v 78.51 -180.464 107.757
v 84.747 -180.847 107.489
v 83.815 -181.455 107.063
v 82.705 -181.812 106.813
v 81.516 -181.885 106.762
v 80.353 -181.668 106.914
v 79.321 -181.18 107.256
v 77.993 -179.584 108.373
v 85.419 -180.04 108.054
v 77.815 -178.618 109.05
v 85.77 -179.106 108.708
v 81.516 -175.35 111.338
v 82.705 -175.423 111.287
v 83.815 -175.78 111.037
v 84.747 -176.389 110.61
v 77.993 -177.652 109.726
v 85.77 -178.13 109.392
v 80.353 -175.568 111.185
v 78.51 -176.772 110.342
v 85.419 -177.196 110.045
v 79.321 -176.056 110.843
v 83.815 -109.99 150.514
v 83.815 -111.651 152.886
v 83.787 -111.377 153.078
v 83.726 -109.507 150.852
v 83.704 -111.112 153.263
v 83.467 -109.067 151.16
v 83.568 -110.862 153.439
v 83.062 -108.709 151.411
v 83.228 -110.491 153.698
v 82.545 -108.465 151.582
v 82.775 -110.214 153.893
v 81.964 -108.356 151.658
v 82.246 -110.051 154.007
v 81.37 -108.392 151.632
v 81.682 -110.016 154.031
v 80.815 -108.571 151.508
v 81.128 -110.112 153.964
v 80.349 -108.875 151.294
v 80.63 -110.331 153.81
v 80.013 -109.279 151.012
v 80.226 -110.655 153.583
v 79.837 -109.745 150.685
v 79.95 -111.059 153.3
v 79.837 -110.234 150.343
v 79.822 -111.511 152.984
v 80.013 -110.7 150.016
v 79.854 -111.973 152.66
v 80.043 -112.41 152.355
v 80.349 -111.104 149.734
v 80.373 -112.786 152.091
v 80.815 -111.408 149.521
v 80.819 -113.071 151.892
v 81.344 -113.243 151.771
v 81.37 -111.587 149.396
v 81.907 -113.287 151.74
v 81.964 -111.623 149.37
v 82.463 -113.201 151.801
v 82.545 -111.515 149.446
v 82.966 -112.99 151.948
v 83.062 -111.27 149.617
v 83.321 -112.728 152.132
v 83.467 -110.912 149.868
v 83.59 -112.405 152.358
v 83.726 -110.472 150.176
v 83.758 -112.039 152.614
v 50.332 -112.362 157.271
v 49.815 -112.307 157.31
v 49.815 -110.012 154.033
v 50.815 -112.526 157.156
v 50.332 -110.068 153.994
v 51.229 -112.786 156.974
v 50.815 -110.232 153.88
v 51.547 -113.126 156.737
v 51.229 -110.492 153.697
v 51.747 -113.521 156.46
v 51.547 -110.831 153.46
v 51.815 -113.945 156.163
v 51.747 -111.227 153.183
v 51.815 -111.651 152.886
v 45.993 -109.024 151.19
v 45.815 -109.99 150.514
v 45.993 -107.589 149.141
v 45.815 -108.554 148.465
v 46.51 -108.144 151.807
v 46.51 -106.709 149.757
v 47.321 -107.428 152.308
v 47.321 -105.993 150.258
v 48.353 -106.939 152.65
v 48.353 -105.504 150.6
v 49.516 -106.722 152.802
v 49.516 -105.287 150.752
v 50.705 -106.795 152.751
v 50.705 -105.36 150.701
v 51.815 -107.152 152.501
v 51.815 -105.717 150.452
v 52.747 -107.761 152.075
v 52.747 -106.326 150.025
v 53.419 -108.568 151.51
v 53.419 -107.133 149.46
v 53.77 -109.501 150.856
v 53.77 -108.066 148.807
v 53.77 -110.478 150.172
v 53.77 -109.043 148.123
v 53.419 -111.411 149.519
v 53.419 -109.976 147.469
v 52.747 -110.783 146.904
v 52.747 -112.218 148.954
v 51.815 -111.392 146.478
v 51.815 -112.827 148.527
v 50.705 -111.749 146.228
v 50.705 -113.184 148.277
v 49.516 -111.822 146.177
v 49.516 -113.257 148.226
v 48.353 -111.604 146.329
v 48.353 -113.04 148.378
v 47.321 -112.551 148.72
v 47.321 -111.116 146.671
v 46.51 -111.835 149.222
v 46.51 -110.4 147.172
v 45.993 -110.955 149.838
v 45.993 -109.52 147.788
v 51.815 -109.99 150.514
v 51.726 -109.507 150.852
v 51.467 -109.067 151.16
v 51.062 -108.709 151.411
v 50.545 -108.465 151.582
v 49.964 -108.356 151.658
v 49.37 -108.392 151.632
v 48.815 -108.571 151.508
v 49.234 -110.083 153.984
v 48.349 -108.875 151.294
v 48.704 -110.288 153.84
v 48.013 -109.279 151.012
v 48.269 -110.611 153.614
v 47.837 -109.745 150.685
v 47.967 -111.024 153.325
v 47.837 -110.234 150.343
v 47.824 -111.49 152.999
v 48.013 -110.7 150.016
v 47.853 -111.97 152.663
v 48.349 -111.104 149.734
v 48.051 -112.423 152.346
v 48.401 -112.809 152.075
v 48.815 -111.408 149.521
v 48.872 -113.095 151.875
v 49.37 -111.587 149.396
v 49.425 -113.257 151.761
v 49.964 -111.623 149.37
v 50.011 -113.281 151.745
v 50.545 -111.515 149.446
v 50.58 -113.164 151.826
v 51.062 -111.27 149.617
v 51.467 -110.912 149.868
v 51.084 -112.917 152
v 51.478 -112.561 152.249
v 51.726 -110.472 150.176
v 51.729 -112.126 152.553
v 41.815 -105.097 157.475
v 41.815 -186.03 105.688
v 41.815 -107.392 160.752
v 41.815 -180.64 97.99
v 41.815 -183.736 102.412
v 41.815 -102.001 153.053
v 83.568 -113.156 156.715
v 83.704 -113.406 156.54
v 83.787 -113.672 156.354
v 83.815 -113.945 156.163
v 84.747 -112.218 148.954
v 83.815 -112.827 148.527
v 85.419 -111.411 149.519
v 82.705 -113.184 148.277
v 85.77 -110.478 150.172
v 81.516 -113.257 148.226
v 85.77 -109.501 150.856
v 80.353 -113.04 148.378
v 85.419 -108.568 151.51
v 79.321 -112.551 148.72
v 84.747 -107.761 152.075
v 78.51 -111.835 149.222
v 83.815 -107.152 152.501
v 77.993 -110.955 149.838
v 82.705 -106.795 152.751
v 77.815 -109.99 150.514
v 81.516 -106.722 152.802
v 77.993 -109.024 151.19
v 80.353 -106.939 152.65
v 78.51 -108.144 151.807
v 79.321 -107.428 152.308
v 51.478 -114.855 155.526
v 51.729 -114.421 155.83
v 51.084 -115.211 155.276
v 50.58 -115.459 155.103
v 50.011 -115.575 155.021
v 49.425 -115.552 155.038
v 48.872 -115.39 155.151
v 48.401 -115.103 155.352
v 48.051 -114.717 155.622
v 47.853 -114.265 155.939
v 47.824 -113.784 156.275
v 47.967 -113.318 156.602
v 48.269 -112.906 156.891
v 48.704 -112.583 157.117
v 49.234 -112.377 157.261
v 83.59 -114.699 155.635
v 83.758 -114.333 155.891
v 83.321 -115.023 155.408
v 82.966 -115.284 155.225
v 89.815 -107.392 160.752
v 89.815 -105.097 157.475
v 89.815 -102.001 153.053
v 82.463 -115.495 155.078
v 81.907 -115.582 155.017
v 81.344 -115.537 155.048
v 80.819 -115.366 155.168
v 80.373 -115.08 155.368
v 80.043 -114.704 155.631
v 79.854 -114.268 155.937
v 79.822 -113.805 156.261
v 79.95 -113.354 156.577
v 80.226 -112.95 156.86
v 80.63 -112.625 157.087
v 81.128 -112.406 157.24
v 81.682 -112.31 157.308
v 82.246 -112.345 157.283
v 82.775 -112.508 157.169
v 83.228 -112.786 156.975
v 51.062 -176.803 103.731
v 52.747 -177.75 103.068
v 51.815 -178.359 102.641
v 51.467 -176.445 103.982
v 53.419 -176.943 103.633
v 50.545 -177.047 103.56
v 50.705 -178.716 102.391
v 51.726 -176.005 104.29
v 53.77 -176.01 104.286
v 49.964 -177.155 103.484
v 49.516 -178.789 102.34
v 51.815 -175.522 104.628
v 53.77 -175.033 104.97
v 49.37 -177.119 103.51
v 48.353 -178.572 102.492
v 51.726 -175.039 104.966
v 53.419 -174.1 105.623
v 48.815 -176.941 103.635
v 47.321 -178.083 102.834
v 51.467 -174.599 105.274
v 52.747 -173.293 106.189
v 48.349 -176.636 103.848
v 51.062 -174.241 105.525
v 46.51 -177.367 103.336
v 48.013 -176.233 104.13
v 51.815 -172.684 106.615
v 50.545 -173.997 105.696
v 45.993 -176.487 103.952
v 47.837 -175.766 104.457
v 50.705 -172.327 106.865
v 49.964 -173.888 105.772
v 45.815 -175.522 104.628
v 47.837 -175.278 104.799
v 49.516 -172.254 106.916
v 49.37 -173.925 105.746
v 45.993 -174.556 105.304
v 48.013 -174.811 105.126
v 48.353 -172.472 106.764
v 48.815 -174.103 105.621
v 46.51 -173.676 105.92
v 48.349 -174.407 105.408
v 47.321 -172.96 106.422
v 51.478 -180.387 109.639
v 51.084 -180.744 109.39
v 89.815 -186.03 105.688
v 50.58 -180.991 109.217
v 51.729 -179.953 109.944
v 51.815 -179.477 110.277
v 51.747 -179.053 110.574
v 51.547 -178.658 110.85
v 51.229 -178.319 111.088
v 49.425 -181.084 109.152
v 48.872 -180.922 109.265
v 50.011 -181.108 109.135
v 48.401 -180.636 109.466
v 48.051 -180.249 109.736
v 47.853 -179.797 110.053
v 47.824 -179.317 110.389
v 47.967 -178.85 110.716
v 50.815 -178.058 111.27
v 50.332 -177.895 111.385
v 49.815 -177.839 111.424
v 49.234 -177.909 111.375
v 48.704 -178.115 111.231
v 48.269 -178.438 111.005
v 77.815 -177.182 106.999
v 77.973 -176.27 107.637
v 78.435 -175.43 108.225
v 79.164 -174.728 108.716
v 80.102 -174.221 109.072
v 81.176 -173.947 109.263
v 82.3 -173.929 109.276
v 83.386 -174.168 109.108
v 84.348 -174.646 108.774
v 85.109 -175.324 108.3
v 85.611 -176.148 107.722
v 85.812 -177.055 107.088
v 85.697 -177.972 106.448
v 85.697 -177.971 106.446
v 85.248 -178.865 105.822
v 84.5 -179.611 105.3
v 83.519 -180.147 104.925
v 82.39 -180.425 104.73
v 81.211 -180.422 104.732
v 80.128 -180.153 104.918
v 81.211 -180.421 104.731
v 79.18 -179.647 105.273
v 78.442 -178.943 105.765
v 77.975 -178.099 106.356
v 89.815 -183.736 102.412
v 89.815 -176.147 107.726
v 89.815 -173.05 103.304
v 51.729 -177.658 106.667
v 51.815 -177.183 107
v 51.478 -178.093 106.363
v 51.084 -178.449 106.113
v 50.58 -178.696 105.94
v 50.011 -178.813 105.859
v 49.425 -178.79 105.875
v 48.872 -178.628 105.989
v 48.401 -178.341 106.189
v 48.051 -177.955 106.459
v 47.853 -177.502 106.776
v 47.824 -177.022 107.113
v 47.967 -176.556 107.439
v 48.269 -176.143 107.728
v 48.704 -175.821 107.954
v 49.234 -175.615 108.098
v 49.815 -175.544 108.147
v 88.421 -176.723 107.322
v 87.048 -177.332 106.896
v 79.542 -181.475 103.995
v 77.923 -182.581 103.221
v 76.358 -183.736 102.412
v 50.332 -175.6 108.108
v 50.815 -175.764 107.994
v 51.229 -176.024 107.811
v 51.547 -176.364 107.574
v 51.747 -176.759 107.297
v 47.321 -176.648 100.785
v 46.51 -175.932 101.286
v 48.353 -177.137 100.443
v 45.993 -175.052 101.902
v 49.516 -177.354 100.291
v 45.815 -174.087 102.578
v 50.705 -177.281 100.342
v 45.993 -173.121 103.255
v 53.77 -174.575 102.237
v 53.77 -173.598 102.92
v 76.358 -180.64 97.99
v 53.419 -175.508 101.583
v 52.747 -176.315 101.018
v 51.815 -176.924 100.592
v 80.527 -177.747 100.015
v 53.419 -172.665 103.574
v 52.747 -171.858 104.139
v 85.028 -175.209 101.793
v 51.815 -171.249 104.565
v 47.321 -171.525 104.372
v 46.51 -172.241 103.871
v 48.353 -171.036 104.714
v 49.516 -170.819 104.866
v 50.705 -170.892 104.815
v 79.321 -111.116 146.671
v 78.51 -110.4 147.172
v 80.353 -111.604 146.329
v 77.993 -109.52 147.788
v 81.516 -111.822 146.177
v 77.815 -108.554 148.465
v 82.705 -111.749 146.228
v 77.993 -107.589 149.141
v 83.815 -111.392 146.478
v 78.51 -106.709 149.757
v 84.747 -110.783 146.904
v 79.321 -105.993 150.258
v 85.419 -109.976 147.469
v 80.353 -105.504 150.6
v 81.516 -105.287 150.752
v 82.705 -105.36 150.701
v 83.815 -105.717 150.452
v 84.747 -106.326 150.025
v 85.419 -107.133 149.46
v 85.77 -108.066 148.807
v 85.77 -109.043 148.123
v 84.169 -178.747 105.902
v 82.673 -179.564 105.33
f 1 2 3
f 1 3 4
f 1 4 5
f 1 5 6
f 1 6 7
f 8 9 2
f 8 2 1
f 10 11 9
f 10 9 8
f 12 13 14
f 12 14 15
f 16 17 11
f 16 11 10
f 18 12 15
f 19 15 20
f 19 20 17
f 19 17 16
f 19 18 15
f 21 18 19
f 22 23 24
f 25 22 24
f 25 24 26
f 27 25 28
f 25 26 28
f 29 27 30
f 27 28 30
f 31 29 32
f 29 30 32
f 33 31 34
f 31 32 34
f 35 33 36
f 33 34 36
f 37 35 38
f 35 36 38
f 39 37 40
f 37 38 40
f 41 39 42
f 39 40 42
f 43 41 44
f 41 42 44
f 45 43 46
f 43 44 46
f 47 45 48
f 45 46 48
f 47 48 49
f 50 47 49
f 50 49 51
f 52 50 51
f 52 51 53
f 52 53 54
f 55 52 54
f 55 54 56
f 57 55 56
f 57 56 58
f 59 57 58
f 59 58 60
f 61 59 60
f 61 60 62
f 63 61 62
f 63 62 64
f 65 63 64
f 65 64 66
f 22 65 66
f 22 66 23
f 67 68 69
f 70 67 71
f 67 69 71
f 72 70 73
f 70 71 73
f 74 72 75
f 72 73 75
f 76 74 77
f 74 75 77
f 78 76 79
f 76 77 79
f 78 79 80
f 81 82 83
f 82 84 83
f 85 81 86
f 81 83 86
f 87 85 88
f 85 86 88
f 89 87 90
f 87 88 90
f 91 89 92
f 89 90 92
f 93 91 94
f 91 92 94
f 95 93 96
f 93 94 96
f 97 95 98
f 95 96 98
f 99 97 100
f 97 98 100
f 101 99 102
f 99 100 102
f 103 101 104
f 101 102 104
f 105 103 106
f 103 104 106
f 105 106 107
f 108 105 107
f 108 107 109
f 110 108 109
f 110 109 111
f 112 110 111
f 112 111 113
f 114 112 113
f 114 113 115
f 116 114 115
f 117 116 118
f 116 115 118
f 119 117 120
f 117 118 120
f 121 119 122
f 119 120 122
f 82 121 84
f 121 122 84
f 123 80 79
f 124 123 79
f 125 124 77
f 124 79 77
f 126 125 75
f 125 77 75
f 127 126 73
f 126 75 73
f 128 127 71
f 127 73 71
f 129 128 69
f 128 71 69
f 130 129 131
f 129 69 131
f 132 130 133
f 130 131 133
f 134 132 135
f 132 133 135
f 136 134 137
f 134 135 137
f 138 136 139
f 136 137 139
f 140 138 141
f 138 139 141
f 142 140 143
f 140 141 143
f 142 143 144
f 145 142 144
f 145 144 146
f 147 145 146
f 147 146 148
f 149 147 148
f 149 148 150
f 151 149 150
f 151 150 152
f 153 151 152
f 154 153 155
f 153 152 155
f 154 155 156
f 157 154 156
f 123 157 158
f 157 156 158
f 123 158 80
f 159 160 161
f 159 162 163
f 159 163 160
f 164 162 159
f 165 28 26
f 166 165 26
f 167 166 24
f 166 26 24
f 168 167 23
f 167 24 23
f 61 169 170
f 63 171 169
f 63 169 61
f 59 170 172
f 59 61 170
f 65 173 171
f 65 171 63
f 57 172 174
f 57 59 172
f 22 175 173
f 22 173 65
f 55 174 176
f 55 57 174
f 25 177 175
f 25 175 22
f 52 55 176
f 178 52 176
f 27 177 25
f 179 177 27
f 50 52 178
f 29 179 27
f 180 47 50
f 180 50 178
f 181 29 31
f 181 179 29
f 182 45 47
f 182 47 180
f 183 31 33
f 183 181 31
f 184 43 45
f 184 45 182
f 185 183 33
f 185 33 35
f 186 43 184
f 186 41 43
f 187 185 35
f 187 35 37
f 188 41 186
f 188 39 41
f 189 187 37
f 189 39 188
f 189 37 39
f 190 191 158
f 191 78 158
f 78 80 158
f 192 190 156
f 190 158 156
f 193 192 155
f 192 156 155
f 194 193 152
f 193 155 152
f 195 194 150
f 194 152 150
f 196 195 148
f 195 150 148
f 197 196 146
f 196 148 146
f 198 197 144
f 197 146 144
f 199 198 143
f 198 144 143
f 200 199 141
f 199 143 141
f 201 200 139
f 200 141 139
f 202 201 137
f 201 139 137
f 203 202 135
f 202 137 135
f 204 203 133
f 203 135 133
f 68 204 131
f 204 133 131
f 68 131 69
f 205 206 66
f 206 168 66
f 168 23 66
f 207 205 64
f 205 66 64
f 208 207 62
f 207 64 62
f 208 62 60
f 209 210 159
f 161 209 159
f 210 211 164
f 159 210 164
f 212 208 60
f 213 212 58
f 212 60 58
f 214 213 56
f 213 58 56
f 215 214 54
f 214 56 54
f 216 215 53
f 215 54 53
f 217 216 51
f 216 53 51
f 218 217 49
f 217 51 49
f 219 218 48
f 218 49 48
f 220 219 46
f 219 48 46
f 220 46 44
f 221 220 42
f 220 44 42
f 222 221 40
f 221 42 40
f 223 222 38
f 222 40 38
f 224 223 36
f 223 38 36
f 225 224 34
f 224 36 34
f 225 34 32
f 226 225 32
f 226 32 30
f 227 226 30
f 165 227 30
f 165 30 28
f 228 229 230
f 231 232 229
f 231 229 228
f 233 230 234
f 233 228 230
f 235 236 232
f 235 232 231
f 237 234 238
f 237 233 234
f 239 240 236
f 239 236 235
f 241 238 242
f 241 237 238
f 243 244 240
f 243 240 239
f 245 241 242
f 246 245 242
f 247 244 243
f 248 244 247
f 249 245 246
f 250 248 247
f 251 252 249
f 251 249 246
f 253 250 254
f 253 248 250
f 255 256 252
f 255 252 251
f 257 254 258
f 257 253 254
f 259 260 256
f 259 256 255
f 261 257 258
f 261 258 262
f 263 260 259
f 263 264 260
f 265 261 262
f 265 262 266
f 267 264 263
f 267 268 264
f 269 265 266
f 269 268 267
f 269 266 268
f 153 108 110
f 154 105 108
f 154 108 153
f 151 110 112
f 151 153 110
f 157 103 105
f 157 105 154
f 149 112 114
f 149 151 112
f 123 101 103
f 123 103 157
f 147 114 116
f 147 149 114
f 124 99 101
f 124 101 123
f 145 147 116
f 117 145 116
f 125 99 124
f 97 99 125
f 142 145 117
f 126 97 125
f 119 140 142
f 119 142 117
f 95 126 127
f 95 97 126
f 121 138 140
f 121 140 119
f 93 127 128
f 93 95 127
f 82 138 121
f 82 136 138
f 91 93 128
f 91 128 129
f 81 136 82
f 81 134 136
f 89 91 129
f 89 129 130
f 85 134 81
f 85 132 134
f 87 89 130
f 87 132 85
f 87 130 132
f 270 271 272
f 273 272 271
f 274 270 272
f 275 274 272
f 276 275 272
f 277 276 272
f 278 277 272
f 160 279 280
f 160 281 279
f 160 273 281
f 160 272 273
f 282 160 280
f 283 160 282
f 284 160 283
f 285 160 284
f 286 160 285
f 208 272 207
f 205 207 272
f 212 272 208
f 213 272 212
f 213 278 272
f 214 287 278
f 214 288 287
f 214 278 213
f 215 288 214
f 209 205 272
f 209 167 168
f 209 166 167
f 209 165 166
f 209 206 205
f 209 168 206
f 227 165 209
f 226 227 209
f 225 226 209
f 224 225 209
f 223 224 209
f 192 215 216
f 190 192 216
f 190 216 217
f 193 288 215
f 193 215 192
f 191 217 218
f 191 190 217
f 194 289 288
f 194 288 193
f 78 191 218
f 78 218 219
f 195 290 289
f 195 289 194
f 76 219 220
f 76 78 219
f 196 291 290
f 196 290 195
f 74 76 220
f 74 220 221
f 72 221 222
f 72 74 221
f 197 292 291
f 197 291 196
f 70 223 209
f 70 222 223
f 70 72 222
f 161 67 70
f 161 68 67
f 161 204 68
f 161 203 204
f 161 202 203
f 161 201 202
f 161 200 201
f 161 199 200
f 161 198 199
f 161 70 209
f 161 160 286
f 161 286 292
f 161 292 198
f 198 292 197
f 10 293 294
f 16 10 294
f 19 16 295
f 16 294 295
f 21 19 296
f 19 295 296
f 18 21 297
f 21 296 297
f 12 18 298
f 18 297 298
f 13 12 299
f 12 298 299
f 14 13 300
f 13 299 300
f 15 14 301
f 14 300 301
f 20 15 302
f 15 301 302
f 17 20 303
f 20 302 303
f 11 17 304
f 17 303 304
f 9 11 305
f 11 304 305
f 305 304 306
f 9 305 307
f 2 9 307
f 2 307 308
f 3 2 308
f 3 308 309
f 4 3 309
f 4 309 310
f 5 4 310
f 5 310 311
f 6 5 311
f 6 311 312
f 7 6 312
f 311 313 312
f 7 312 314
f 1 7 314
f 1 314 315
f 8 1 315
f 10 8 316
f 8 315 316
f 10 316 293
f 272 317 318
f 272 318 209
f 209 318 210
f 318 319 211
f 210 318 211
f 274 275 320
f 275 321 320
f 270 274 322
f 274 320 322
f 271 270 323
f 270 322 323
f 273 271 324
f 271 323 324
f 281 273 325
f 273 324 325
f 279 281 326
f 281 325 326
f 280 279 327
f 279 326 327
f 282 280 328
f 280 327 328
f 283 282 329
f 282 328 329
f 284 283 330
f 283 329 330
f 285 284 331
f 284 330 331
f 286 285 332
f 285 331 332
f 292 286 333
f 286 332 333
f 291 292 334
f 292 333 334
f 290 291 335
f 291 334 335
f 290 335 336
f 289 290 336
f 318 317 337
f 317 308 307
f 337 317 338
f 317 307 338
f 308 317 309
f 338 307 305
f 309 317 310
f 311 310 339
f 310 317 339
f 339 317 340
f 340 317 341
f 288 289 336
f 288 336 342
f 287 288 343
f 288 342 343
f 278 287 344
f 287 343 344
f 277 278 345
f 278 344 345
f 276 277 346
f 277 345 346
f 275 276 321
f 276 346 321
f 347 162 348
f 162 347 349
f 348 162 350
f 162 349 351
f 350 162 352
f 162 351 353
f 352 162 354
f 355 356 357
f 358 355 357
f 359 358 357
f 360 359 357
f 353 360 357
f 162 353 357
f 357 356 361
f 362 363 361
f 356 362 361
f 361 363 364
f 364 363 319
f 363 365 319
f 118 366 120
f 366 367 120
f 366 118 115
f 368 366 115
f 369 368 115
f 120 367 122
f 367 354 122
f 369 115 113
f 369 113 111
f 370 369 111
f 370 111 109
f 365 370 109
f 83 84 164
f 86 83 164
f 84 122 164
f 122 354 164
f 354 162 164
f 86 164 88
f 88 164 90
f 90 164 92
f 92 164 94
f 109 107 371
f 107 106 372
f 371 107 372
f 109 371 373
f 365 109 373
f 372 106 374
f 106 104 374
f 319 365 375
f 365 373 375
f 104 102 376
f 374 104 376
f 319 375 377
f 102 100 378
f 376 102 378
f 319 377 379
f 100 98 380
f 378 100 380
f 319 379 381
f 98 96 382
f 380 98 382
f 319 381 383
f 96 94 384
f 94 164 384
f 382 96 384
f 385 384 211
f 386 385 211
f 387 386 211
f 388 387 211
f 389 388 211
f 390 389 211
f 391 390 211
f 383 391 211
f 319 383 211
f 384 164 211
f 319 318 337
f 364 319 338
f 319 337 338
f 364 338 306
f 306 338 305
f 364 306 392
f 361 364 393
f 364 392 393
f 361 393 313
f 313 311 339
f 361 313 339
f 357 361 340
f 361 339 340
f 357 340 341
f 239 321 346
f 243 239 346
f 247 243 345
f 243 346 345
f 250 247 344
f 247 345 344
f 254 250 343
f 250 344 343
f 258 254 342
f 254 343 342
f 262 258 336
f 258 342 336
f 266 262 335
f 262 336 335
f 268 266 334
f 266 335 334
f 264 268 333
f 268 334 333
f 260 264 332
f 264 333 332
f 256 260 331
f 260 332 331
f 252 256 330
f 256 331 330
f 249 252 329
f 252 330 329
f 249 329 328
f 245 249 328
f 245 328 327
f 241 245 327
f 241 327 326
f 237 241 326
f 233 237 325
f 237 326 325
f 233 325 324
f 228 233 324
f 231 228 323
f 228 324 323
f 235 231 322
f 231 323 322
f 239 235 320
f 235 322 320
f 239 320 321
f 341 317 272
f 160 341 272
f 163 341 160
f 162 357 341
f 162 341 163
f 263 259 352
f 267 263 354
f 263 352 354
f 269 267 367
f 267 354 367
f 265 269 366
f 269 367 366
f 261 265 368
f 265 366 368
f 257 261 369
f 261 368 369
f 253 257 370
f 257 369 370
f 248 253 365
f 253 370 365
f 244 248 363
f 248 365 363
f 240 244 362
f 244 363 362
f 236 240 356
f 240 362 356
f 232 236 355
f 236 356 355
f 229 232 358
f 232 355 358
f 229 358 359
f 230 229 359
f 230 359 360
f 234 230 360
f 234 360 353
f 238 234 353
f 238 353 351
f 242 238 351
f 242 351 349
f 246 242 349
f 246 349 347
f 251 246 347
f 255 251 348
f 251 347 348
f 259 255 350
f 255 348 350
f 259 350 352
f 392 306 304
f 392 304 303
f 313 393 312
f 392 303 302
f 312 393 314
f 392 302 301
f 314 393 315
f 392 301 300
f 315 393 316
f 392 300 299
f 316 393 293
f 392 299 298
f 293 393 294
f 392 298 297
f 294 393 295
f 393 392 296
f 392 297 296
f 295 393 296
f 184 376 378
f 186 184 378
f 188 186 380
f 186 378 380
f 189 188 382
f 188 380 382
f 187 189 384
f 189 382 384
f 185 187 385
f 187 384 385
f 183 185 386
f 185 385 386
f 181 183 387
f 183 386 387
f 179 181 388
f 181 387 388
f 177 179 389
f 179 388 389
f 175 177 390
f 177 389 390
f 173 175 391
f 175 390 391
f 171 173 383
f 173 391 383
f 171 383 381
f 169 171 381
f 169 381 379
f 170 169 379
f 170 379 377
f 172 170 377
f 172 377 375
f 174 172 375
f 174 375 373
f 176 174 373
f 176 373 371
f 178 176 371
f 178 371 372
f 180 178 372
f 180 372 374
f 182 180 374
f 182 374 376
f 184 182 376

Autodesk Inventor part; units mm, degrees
ref_plane "YZ Plane" through (0, 0, 0) normal (1, 0, 0) x (0, 1, 0)
ref_plane "XZ Plane" through (0, 0, 0) normal (0, 1, 0) x (-1, 0, 0)
ref_plane "XY Plane" through (0, 0, 0) normal (0, 0, 1) x (1, 0, 0)
ref_plane "Work Plane1" through (87.3148, -183.736, 102.4116) normal (0, -0.5736, 0.8192) x (0, 0.8192, 0.5736)
sketch "Sketch1" plane through (87.3148, -183.736, 102.4116) normal (0, -0.5736, 0.8192) x (0, 0.8192, 0.5736)
  line L0 (96, -2.5) -> (96, 45.5) projected
  line L1 (0, 45.5) -> (96, 45.5) projected
  line L2 (0, -2.5) -> (0, 45.5) projected
  line L3 (-64, -2.5) -> (104, -2.5) projected
  circle A0 centre (-40, -26.5) radius 50.8 projected
  circle A1 centre (88, 37.5) radius 2 projected
  arc A2 (88.9632, 3.7472) -> (86.3648, 4.3484) centre (88, 5.5) ccw projected
  circle A3 centre (8, 37.5) radius 2 projected
  circle A4 centre (8, 5.5) radius 2 projected
  circle A5 centre (88, 5.5) radius 2
  circle A6 centre (-40, -26.5) radius 52.8
  point P0 (91.7668, 87.3148)
  point P1 (88.9632, 3.7472)
  point P2 (86.3648, 4.3484)
  dimension "d0" = 4
  dimension "d1" = 2
extrude "Extrusion1" add sketch "Sketch1" along normal blind 4 contours L3 A6 L2 L1 L0 | L3 A0 L2 A6 | L3 L2 A0 picked at (5.5904, -1.2761) picked at (0.5767, 1.5949)
sketch "Sketch2" plane through (87.3148, -186.0303, 105.6882) normal (0, -0.5736, 0.8192) x (1, 0, 0)
  line L0 (-45.5, 0) -> (2.5, 0) projected
  line L1 (2.5, 0) -> (2.5, 96) projected
  line L2 (2.5, 96) -> (-45.5, 96) projected
  line L3 (-45.5, 96) -> (-45.5, 0) projected
  circle A0 centre (-5.5, 8) radius 2 projected
  circle A1 centre (-37.5, 8) radius 2 projected
  circle A2 centre (-5.5, 88) radius 2 projected
  circle A3 centre (-37.5, 88) radius 2 projected
  circle A4 centre (26.5, -40) radius 50.8 projected
  circle A5 centre (26.5, -40) radius 54.8
  point P0 (-87.3148, 91.7668)
  point P1 (-10.9572, 0)
  point P2 (2.5, 9.265)
  dimension "d4" = 4
extrude "Extrusion2" add sketch "Sketch2" against normal blind 9.398 contours L3 L2 L1 A5 L0 | A0
sketch "Sketch3" plane through (87.3148, -183.736, 102.4116) normal (0, 0.5736, -0.8192) x (-1, 0, 0)
  circle A0 centre (5.5, 88) radius 2 projected
  circle A1 centre (37.5, 88) radius 2 projected
  circle A2 centre (37.5, 8) radius 2 projected
  circle A3 centre (5.5, 8) radius 2 projected
  circle A4 centre (5.5, 8) radius 4
  point P0 (87.3148, 91.7668)
  dimension "d12" = 8
sketch "Sketch4" plane through (87.3148, -180.6398, 97.9899) normal (0, 0.5736, -0.8192) x (-1, 0, 0)
  circle A0 centre (5.5, 88) radius 2 projected
  circle A1 centre (37.5, 88) radius 2 projected
  circle A2 centre (37.5, 8) radius 2 projected
  circle A3 centre (5.5, 88) radius 4
  circle A4 centre (37.5, 88) radius 4
  circle A5 centre (37.5, 8) radius 2 projected
  circle A6 centre (37.5, 8) radius 4
  point P0 (87.3148, 91.7668)
  dimension "d7" = 8
  dimension "d8" = 8
  dimension "d9" = 8
extrude "Extrusion3" cut sketch "Sketch4" against normal blind 2.5 contours A0 | A1 | A2 | A3 | A4 | A6
extrude "Extrusion4" cut sketch "Sketch3" against normal blind 2.5 contours A3 | A4
properties part number "shooter spacer"
